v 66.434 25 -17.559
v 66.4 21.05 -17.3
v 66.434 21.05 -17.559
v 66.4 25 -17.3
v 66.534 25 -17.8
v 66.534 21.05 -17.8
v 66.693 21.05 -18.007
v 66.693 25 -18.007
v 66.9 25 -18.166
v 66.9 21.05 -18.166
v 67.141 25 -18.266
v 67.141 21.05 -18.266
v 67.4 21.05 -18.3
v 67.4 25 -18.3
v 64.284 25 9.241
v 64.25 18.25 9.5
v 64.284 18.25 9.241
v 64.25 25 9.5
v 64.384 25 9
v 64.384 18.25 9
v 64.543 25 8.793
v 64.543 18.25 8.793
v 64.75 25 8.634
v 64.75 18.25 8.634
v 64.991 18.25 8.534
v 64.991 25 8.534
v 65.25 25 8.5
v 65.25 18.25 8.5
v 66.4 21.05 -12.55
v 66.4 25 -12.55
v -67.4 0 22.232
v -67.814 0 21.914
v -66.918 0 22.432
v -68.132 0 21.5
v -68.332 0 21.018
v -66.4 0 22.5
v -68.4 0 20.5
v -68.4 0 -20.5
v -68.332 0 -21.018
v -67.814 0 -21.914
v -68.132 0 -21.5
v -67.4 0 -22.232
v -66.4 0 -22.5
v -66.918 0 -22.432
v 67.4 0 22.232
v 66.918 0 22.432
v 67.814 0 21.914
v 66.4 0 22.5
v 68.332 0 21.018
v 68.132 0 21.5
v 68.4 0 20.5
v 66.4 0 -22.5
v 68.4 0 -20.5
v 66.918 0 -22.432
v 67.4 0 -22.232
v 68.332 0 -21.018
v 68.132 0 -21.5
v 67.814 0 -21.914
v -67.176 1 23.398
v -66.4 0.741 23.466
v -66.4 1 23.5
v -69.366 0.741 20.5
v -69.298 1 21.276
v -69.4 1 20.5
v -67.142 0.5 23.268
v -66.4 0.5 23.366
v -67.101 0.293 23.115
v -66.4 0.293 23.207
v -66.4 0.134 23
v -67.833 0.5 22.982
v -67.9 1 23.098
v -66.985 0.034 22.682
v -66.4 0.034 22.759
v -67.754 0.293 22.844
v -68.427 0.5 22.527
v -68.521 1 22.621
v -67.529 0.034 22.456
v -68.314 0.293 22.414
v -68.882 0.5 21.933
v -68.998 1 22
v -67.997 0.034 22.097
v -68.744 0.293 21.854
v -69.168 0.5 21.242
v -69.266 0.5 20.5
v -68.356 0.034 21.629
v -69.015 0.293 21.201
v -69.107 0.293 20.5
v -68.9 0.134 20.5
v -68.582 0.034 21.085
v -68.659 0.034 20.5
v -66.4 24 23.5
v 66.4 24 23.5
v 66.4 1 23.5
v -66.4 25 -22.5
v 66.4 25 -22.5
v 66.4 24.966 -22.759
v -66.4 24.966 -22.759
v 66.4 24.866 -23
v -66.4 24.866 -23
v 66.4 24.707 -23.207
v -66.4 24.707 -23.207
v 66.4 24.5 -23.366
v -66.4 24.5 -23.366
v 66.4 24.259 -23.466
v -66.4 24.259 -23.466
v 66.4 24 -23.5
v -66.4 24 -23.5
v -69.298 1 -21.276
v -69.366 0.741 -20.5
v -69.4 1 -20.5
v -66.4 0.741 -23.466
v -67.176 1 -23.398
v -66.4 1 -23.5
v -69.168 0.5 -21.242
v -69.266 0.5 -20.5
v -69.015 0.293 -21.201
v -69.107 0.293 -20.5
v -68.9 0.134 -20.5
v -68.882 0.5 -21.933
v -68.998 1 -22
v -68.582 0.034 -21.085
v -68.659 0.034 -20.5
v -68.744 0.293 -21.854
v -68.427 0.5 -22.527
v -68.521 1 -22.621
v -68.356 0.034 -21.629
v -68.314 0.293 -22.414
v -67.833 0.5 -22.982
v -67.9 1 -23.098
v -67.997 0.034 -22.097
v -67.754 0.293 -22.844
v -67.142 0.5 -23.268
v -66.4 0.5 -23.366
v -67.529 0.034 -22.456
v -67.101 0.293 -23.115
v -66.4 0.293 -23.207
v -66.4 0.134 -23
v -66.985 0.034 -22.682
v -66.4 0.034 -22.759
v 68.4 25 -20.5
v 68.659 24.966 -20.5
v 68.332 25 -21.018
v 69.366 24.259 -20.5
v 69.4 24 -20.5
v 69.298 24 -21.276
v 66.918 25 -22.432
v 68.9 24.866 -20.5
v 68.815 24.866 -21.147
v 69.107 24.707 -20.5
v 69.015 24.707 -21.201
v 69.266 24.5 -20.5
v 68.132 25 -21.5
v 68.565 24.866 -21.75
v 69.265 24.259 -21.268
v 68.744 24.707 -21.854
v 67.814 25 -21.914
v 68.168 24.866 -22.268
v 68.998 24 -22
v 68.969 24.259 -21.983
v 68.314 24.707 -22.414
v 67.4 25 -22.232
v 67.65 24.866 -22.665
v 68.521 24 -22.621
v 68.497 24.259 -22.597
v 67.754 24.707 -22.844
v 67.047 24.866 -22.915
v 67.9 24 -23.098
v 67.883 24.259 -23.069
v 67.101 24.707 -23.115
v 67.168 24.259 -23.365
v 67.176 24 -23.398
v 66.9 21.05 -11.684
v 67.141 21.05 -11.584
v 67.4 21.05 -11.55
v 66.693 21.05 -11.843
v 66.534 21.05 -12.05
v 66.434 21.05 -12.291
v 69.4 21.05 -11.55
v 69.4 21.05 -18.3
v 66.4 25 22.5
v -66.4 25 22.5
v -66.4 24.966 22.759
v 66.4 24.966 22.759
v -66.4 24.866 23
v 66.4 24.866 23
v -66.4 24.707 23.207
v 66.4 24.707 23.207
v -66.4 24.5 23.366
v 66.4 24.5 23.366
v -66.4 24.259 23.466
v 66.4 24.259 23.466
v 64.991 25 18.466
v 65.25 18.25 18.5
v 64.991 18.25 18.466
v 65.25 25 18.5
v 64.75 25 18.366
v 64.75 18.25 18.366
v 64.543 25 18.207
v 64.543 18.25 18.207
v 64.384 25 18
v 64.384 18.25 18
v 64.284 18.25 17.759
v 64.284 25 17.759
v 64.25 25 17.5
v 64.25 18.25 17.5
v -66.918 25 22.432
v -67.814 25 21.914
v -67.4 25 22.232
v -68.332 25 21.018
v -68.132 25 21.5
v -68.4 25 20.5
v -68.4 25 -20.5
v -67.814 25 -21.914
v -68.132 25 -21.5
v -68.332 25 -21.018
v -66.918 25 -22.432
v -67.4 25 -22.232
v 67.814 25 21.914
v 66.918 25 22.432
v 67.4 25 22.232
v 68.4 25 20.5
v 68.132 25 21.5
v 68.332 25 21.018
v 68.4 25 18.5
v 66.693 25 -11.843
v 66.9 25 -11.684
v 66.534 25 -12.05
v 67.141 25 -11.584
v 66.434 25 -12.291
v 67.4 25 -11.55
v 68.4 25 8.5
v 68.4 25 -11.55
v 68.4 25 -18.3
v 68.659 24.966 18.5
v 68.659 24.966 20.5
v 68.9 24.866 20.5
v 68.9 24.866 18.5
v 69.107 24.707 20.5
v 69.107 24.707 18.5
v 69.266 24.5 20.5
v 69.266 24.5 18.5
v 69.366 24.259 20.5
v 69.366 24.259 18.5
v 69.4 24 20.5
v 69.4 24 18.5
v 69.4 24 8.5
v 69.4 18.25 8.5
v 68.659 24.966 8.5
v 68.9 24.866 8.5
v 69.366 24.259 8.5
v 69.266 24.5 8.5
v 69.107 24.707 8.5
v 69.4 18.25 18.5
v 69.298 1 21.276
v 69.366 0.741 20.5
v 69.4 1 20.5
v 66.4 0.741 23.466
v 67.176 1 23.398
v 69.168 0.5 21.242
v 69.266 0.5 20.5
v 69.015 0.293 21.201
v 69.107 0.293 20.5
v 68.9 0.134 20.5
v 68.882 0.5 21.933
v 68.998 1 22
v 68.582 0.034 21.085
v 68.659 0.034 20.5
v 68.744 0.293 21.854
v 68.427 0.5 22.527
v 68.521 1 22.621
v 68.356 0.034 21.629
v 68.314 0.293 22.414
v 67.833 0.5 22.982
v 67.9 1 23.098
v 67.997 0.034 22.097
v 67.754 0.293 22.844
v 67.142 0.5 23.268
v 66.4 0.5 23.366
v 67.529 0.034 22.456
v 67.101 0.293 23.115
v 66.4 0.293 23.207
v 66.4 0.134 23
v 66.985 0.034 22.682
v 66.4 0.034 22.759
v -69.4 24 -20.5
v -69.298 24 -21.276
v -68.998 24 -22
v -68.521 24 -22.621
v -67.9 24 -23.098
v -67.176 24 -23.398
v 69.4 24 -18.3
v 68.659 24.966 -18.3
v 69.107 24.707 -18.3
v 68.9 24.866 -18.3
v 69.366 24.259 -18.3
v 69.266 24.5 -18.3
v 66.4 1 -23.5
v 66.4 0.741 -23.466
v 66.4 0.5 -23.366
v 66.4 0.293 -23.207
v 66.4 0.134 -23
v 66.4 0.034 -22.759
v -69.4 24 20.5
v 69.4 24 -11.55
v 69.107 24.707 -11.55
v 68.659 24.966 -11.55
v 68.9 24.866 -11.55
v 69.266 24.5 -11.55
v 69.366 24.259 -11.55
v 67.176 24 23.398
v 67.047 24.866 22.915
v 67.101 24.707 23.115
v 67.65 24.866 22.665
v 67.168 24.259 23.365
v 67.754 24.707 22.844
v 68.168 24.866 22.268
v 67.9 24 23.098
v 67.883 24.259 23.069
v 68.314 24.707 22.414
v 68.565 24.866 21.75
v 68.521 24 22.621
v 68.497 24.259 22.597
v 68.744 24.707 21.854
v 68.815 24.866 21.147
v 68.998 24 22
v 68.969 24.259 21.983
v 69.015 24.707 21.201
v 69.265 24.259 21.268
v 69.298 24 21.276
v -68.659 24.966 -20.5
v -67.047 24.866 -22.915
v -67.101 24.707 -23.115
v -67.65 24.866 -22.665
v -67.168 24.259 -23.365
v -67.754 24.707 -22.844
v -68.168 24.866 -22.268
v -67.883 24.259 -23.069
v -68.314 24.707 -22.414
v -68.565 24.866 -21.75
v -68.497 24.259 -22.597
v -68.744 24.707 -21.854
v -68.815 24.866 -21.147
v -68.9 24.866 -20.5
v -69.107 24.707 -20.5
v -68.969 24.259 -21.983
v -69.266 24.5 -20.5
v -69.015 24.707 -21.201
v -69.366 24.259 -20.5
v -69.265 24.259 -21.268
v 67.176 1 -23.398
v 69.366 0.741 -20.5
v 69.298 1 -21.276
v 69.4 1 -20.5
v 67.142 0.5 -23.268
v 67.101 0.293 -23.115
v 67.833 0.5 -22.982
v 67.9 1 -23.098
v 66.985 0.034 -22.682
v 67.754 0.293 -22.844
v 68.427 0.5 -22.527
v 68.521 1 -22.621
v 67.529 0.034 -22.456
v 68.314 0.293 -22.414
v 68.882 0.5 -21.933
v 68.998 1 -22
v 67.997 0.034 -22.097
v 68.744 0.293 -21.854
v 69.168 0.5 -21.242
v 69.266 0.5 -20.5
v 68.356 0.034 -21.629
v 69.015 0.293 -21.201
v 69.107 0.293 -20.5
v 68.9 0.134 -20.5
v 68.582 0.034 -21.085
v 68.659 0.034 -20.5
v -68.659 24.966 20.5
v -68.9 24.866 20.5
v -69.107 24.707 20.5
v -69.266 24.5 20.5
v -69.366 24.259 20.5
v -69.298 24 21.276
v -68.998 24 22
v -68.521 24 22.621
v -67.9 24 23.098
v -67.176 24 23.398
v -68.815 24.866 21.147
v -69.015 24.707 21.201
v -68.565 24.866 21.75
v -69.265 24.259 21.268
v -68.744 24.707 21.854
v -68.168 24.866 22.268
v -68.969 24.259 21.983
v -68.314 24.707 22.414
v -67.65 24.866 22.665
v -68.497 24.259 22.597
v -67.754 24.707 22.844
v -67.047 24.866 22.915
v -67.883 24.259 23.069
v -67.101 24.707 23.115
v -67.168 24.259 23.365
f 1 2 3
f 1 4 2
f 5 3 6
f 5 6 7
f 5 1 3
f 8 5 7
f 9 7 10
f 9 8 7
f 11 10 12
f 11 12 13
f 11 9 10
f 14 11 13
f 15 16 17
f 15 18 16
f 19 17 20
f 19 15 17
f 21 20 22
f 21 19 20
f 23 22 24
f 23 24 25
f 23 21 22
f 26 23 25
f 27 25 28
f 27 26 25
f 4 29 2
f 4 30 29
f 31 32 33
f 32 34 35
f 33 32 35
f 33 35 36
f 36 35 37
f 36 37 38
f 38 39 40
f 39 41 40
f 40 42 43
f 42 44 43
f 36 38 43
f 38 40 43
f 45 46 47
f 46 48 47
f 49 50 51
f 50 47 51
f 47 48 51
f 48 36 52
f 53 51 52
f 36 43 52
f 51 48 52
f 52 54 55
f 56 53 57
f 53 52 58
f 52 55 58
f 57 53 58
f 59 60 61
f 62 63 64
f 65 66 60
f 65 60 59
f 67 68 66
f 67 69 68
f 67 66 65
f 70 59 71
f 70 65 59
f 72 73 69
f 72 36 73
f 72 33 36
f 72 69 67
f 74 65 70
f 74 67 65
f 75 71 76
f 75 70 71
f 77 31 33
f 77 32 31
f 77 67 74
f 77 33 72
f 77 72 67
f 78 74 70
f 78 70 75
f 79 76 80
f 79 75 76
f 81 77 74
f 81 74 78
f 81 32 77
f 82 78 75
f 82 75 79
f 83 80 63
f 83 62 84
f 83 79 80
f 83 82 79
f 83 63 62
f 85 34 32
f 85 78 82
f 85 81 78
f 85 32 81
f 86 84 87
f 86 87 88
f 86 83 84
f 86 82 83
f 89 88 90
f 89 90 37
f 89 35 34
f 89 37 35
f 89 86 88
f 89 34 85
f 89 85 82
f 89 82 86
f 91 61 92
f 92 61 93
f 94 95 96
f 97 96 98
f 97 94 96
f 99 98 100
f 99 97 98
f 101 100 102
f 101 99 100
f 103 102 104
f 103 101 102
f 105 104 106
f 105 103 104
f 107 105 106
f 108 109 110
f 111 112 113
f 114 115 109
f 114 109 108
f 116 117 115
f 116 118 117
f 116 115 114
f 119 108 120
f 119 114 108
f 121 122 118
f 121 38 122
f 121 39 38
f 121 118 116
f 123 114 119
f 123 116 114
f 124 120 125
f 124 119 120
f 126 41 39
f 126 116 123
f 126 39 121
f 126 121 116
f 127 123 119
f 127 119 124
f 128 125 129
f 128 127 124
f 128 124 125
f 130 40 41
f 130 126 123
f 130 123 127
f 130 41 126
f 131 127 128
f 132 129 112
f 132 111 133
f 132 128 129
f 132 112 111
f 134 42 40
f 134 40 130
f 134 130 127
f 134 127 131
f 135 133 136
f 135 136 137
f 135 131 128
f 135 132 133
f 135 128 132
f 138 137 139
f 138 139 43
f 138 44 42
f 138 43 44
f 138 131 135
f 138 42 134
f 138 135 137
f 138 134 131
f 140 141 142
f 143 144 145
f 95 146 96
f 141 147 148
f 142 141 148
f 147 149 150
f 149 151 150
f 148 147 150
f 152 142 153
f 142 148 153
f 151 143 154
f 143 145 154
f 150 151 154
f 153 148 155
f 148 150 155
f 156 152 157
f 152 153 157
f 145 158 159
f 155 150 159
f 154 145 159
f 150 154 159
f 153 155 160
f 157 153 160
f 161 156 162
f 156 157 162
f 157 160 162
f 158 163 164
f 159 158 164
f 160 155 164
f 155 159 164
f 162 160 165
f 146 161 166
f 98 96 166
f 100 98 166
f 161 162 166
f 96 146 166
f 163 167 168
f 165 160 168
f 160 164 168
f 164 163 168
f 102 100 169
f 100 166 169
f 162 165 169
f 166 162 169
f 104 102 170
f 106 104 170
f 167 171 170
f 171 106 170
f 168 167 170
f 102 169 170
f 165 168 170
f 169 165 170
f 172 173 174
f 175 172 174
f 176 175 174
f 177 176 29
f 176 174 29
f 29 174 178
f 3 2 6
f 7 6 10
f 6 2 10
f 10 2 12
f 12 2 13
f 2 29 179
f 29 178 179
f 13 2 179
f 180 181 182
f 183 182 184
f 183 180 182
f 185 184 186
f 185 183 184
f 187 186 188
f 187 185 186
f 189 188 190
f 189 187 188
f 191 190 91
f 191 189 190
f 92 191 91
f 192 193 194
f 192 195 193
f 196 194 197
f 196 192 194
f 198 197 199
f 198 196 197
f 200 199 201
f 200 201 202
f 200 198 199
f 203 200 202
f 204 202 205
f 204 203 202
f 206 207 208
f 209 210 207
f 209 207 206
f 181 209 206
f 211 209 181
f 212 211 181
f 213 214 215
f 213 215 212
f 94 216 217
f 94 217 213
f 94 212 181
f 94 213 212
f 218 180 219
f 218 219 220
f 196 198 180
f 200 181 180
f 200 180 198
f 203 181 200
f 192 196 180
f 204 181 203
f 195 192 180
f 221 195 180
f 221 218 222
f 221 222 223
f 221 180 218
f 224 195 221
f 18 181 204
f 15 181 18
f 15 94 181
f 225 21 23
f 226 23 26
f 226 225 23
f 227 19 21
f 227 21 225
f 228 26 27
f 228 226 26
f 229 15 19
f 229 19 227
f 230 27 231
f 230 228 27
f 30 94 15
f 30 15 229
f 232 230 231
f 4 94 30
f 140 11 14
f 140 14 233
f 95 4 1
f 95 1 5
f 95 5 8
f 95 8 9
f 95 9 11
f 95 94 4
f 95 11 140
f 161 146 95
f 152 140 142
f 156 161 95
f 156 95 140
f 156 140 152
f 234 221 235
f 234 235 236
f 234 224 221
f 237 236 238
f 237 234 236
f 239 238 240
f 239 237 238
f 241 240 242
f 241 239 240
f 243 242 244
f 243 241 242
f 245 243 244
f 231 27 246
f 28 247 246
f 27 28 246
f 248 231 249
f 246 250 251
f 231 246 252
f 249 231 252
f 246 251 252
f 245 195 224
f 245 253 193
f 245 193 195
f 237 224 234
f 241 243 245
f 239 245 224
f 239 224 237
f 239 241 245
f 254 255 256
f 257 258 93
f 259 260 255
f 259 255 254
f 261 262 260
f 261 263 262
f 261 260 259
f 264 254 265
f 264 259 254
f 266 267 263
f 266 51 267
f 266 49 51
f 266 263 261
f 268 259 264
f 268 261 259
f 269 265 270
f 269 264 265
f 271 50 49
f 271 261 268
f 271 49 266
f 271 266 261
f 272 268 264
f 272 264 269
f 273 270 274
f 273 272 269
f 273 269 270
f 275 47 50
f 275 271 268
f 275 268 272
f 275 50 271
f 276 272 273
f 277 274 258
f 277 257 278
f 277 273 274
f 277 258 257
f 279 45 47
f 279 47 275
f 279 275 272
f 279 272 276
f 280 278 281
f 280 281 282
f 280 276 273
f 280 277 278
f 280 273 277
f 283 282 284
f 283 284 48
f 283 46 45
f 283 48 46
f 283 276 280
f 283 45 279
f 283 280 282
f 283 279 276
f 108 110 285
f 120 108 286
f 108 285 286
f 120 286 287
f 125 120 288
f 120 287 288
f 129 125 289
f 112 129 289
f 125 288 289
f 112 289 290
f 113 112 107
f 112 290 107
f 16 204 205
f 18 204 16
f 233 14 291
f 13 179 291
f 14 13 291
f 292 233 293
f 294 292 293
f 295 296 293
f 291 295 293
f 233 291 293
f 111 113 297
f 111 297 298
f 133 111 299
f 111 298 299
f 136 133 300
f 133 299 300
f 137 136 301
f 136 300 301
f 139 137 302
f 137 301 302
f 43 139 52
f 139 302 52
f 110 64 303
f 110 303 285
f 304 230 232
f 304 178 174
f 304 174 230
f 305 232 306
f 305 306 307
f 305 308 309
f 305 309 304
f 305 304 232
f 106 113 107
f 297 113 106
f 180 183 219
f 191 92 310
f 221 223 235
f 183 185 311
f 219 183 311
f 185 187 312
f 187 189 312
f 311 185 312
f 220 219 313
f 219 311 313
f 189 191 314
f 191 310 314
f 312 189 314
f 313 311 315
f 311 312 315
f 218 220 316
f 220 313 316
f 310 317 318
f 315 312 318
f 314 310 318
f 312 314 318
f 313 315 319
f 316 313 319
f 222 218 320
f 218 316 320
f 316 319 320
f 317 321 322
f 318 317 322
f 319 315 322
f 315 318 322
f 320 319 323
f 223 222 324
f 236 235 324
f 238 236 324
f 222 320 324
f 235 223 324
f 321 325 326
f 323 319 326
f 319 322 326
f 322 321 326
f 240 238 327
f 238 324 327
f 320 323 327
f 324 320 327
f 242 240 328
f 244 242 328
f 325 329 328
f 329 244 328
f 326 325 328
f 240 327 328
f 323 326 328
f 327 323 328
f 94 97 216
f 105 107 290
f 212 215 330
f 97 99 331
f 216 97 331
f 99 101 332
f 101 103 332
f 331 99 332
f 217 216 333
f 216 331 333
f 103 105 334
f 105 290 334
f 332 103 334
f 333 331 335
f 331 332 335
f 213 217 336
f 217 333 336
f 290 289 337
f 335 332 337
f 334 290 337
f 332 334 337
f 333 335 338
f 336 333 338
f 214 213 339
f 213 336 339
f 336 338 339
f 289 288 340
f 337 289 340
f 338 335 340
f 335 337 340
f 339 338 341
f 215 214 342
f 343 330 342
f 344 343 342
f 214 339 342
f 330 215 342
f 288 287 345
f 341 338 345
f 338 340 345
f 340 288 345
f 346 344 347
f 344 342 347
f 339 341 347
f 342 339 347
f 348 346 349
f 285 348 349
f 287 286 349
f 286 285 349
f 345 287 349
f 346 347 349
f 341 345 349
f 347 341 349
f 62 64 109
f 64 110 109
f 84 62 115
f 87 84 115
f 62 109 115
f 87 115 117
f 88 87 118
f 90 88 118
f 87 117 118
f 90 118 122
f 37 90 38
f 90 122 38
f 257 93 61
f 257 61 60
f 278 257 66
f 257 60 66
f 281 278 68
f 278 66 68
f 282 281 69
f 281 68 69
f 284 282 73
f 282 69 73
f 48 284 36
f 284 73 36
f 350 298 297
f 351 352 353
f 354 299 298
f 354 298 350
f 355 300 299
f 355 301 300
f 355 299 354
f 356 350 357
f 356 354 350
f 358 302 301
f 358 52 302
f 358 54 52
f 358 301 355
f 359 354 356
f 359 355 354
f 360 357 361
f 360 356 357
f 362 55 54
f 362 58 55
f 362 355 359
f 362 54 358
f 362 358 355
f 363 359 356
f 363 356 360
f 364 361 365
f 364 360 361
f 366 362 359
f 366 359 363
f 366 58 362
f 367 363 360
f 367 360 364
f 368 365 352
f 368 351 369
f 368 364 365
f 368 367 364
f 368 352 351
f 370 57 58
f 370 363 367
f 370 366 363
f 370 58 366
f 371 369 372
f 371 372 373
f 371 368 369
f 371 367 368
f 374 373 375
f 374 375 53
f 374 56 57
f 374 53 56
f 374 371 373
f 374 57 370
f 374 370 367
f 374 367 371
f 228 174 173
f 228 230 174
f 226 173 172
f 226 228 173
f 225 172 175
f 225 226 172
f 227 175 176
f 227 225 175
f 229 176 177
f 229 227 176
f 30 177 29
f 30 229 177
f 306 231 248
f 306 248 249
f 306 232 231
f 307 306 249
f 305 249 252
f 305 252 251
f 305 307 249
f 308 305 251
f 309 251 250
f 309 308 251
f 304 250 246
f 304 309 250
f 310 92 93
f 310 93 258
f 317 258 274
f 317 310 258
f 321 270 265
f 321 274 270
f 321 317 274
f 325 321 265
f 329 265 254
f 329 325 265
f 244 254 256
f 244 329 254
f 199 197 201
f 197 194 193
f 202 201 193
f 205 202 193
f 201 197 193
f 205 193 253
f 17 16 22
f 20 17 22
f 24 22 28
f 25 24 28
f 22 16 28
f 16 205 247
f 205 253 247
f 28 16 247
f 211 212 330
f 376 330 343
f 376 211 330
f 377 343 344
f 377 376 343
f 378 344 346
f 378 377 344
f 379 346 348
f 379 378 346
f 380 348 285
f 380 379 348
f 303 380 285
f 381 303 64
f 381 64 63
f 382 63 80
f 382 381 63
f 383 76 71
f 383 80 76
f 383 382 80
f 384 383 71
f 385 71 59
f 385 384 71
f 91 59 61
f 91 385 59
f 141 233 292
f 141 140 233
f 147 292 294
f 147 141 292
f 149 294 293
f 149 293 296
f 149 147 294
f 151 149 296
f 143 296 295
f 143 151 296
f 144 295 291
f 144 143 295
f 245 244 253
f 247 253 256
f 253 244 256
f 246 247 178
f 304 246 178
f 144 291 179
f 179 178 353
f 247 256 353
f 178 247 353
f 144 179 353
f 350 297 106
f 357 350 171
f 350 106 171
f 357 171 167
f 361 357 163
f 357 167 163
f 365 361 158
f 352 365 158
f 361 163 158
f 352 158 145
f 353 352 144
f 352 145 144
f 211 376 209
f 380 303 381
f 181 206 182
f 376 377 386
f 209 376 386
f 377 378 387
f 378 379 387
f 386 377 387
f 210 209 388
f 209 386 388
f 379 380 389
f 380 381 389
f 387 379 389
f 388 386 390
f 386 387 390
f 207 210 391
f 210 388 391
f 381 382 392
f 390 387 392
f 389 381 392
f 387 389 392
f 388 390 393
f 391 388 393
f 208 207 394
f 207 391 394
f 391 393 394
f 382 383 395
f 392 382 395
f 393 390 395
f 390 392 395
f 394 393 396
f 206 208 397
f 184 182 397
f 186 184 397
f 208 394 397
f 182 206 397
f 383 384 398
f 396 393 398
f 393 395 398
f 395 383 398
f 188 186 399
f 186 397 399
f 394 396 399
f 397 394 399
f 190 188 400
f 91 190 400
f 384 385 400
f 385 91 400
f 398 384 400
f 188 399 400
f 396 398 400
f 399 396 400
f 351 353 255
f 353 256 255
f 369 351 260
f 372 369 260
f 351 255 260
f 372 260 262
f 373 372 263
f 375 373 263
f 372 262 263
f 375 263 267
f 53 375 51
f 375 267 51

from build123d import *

# Parameters (mm, degrees)
SKETCH1_W           = 138.8
SKETCH1_H           = 47
BOSS_EXTRUDE1_DEPTH = 25
SKETCH2_W           = 10
SKETCH2_H           = 6.75
CUT_EXTRUDE1_DEPTH  = 5.15
SKETCH3_W           = 6.75
SKETCH3_H           = 3.95
CUT_EXTRUDE2_DEPTH  = 3
FILLET1_R           = 3
FILLET2_R           = 1
FILLET3_R           = 1


with BuildPart() as part:
    # Sketch1 → Boss-Extrude1 (new body)
    with BuildSketch(Plane(origin=(0, 0, 0), x_dir=(1, 0, 0), z_dir=(0, 1, 0))):
        Rectangle(SKETCH1_W, SKETCH1_H)
    extrude(amount=BOSS_EXTRUDE1_DEPTH)

    # Sketch2 → Cut-Extrude1 (cut)
    with BuildSketch(Plane(origin=(69.4, 0, 0), x_dir=(0, 0, -1), z_dir=(1, 0, 0))):
        with Locations((-13.5, 21.625)):
            Rectangle(SKETCH2_W, SKETCH2_H)
    extrude(amount=-CUT_EXTRUDE1_DEPTH, mode=Mode.SUBTRACT)

    # Sketch3 → Cut-Extrude2 (cut)
    with BuildSketch(Plane(origin=(69.4, 0, 0), x_dir=(0, 0, -1), z_dir=(1, 0, 0))):
        with Locations((14.925, 23.025)):
            Rectangle(SKETCH3_W, SKETCH3_H)
    extrude(amount=-CUT_EXTRUDE2_DEPTH, mode=Mode.SUBTRACT)

    # Fillet1
    fillet1_edges = [part.edges().sort_by_distance(p)[0] for p in [
        (-69.4, 12.5, 23.5),
        (-69.4, 12.5, -23.5),
        (69.4, 12.5, -23.5),
        (69.4, 12.5, 23.5),
    ]]
    fillet(fillet1_edges, radius=FILLET1_R)

    # Fillet2
    fillet2_edges = [part.edges().sort_by_distance(p)[0] for p in [
        (69.4, 25, -1.525),
        (69.4, 25, -19.4),
        (-69.4, 0, 0),
        (-69.4, 25, 0),
        (0, 0, 23.5),
        (0, 0, -23.5),
        (69.4, 0, 0),
        (-68.521320344, 0, 22.621320344),
        (68.521320344, 0, 22.621320344),
        (68.521320344, 0, -22.621320344),
        (-68.521320344, 0, -22.621320344),
        (0, 25, -23.5),
        (0, 25, 23.5),
        (69.4, 25, 19.5),
        (-68.521320344, 25, 22.621320344),
        (68.521320344, 25, 22.621320344),
        (68.521320344, 25, -22.621320344),
        (-68.521320344, 25, -22.621320344),
    ]]
    fillet(fillet2_edges, radius=FILLET2_R)

    # Fillet3
    fillet3_edges = [part.edges().sort_by_distance(p)[0] for p in [
        (64.25, 21.625, 18.5),
        (64.25, 21.625, 8.5),
        (66.4, 23.025, -11.55),
        (66.4, 23.025, -18.3),
    ]]
    fillet(fillet3_edges, radius=FILLET3_R)


solid = part.part
